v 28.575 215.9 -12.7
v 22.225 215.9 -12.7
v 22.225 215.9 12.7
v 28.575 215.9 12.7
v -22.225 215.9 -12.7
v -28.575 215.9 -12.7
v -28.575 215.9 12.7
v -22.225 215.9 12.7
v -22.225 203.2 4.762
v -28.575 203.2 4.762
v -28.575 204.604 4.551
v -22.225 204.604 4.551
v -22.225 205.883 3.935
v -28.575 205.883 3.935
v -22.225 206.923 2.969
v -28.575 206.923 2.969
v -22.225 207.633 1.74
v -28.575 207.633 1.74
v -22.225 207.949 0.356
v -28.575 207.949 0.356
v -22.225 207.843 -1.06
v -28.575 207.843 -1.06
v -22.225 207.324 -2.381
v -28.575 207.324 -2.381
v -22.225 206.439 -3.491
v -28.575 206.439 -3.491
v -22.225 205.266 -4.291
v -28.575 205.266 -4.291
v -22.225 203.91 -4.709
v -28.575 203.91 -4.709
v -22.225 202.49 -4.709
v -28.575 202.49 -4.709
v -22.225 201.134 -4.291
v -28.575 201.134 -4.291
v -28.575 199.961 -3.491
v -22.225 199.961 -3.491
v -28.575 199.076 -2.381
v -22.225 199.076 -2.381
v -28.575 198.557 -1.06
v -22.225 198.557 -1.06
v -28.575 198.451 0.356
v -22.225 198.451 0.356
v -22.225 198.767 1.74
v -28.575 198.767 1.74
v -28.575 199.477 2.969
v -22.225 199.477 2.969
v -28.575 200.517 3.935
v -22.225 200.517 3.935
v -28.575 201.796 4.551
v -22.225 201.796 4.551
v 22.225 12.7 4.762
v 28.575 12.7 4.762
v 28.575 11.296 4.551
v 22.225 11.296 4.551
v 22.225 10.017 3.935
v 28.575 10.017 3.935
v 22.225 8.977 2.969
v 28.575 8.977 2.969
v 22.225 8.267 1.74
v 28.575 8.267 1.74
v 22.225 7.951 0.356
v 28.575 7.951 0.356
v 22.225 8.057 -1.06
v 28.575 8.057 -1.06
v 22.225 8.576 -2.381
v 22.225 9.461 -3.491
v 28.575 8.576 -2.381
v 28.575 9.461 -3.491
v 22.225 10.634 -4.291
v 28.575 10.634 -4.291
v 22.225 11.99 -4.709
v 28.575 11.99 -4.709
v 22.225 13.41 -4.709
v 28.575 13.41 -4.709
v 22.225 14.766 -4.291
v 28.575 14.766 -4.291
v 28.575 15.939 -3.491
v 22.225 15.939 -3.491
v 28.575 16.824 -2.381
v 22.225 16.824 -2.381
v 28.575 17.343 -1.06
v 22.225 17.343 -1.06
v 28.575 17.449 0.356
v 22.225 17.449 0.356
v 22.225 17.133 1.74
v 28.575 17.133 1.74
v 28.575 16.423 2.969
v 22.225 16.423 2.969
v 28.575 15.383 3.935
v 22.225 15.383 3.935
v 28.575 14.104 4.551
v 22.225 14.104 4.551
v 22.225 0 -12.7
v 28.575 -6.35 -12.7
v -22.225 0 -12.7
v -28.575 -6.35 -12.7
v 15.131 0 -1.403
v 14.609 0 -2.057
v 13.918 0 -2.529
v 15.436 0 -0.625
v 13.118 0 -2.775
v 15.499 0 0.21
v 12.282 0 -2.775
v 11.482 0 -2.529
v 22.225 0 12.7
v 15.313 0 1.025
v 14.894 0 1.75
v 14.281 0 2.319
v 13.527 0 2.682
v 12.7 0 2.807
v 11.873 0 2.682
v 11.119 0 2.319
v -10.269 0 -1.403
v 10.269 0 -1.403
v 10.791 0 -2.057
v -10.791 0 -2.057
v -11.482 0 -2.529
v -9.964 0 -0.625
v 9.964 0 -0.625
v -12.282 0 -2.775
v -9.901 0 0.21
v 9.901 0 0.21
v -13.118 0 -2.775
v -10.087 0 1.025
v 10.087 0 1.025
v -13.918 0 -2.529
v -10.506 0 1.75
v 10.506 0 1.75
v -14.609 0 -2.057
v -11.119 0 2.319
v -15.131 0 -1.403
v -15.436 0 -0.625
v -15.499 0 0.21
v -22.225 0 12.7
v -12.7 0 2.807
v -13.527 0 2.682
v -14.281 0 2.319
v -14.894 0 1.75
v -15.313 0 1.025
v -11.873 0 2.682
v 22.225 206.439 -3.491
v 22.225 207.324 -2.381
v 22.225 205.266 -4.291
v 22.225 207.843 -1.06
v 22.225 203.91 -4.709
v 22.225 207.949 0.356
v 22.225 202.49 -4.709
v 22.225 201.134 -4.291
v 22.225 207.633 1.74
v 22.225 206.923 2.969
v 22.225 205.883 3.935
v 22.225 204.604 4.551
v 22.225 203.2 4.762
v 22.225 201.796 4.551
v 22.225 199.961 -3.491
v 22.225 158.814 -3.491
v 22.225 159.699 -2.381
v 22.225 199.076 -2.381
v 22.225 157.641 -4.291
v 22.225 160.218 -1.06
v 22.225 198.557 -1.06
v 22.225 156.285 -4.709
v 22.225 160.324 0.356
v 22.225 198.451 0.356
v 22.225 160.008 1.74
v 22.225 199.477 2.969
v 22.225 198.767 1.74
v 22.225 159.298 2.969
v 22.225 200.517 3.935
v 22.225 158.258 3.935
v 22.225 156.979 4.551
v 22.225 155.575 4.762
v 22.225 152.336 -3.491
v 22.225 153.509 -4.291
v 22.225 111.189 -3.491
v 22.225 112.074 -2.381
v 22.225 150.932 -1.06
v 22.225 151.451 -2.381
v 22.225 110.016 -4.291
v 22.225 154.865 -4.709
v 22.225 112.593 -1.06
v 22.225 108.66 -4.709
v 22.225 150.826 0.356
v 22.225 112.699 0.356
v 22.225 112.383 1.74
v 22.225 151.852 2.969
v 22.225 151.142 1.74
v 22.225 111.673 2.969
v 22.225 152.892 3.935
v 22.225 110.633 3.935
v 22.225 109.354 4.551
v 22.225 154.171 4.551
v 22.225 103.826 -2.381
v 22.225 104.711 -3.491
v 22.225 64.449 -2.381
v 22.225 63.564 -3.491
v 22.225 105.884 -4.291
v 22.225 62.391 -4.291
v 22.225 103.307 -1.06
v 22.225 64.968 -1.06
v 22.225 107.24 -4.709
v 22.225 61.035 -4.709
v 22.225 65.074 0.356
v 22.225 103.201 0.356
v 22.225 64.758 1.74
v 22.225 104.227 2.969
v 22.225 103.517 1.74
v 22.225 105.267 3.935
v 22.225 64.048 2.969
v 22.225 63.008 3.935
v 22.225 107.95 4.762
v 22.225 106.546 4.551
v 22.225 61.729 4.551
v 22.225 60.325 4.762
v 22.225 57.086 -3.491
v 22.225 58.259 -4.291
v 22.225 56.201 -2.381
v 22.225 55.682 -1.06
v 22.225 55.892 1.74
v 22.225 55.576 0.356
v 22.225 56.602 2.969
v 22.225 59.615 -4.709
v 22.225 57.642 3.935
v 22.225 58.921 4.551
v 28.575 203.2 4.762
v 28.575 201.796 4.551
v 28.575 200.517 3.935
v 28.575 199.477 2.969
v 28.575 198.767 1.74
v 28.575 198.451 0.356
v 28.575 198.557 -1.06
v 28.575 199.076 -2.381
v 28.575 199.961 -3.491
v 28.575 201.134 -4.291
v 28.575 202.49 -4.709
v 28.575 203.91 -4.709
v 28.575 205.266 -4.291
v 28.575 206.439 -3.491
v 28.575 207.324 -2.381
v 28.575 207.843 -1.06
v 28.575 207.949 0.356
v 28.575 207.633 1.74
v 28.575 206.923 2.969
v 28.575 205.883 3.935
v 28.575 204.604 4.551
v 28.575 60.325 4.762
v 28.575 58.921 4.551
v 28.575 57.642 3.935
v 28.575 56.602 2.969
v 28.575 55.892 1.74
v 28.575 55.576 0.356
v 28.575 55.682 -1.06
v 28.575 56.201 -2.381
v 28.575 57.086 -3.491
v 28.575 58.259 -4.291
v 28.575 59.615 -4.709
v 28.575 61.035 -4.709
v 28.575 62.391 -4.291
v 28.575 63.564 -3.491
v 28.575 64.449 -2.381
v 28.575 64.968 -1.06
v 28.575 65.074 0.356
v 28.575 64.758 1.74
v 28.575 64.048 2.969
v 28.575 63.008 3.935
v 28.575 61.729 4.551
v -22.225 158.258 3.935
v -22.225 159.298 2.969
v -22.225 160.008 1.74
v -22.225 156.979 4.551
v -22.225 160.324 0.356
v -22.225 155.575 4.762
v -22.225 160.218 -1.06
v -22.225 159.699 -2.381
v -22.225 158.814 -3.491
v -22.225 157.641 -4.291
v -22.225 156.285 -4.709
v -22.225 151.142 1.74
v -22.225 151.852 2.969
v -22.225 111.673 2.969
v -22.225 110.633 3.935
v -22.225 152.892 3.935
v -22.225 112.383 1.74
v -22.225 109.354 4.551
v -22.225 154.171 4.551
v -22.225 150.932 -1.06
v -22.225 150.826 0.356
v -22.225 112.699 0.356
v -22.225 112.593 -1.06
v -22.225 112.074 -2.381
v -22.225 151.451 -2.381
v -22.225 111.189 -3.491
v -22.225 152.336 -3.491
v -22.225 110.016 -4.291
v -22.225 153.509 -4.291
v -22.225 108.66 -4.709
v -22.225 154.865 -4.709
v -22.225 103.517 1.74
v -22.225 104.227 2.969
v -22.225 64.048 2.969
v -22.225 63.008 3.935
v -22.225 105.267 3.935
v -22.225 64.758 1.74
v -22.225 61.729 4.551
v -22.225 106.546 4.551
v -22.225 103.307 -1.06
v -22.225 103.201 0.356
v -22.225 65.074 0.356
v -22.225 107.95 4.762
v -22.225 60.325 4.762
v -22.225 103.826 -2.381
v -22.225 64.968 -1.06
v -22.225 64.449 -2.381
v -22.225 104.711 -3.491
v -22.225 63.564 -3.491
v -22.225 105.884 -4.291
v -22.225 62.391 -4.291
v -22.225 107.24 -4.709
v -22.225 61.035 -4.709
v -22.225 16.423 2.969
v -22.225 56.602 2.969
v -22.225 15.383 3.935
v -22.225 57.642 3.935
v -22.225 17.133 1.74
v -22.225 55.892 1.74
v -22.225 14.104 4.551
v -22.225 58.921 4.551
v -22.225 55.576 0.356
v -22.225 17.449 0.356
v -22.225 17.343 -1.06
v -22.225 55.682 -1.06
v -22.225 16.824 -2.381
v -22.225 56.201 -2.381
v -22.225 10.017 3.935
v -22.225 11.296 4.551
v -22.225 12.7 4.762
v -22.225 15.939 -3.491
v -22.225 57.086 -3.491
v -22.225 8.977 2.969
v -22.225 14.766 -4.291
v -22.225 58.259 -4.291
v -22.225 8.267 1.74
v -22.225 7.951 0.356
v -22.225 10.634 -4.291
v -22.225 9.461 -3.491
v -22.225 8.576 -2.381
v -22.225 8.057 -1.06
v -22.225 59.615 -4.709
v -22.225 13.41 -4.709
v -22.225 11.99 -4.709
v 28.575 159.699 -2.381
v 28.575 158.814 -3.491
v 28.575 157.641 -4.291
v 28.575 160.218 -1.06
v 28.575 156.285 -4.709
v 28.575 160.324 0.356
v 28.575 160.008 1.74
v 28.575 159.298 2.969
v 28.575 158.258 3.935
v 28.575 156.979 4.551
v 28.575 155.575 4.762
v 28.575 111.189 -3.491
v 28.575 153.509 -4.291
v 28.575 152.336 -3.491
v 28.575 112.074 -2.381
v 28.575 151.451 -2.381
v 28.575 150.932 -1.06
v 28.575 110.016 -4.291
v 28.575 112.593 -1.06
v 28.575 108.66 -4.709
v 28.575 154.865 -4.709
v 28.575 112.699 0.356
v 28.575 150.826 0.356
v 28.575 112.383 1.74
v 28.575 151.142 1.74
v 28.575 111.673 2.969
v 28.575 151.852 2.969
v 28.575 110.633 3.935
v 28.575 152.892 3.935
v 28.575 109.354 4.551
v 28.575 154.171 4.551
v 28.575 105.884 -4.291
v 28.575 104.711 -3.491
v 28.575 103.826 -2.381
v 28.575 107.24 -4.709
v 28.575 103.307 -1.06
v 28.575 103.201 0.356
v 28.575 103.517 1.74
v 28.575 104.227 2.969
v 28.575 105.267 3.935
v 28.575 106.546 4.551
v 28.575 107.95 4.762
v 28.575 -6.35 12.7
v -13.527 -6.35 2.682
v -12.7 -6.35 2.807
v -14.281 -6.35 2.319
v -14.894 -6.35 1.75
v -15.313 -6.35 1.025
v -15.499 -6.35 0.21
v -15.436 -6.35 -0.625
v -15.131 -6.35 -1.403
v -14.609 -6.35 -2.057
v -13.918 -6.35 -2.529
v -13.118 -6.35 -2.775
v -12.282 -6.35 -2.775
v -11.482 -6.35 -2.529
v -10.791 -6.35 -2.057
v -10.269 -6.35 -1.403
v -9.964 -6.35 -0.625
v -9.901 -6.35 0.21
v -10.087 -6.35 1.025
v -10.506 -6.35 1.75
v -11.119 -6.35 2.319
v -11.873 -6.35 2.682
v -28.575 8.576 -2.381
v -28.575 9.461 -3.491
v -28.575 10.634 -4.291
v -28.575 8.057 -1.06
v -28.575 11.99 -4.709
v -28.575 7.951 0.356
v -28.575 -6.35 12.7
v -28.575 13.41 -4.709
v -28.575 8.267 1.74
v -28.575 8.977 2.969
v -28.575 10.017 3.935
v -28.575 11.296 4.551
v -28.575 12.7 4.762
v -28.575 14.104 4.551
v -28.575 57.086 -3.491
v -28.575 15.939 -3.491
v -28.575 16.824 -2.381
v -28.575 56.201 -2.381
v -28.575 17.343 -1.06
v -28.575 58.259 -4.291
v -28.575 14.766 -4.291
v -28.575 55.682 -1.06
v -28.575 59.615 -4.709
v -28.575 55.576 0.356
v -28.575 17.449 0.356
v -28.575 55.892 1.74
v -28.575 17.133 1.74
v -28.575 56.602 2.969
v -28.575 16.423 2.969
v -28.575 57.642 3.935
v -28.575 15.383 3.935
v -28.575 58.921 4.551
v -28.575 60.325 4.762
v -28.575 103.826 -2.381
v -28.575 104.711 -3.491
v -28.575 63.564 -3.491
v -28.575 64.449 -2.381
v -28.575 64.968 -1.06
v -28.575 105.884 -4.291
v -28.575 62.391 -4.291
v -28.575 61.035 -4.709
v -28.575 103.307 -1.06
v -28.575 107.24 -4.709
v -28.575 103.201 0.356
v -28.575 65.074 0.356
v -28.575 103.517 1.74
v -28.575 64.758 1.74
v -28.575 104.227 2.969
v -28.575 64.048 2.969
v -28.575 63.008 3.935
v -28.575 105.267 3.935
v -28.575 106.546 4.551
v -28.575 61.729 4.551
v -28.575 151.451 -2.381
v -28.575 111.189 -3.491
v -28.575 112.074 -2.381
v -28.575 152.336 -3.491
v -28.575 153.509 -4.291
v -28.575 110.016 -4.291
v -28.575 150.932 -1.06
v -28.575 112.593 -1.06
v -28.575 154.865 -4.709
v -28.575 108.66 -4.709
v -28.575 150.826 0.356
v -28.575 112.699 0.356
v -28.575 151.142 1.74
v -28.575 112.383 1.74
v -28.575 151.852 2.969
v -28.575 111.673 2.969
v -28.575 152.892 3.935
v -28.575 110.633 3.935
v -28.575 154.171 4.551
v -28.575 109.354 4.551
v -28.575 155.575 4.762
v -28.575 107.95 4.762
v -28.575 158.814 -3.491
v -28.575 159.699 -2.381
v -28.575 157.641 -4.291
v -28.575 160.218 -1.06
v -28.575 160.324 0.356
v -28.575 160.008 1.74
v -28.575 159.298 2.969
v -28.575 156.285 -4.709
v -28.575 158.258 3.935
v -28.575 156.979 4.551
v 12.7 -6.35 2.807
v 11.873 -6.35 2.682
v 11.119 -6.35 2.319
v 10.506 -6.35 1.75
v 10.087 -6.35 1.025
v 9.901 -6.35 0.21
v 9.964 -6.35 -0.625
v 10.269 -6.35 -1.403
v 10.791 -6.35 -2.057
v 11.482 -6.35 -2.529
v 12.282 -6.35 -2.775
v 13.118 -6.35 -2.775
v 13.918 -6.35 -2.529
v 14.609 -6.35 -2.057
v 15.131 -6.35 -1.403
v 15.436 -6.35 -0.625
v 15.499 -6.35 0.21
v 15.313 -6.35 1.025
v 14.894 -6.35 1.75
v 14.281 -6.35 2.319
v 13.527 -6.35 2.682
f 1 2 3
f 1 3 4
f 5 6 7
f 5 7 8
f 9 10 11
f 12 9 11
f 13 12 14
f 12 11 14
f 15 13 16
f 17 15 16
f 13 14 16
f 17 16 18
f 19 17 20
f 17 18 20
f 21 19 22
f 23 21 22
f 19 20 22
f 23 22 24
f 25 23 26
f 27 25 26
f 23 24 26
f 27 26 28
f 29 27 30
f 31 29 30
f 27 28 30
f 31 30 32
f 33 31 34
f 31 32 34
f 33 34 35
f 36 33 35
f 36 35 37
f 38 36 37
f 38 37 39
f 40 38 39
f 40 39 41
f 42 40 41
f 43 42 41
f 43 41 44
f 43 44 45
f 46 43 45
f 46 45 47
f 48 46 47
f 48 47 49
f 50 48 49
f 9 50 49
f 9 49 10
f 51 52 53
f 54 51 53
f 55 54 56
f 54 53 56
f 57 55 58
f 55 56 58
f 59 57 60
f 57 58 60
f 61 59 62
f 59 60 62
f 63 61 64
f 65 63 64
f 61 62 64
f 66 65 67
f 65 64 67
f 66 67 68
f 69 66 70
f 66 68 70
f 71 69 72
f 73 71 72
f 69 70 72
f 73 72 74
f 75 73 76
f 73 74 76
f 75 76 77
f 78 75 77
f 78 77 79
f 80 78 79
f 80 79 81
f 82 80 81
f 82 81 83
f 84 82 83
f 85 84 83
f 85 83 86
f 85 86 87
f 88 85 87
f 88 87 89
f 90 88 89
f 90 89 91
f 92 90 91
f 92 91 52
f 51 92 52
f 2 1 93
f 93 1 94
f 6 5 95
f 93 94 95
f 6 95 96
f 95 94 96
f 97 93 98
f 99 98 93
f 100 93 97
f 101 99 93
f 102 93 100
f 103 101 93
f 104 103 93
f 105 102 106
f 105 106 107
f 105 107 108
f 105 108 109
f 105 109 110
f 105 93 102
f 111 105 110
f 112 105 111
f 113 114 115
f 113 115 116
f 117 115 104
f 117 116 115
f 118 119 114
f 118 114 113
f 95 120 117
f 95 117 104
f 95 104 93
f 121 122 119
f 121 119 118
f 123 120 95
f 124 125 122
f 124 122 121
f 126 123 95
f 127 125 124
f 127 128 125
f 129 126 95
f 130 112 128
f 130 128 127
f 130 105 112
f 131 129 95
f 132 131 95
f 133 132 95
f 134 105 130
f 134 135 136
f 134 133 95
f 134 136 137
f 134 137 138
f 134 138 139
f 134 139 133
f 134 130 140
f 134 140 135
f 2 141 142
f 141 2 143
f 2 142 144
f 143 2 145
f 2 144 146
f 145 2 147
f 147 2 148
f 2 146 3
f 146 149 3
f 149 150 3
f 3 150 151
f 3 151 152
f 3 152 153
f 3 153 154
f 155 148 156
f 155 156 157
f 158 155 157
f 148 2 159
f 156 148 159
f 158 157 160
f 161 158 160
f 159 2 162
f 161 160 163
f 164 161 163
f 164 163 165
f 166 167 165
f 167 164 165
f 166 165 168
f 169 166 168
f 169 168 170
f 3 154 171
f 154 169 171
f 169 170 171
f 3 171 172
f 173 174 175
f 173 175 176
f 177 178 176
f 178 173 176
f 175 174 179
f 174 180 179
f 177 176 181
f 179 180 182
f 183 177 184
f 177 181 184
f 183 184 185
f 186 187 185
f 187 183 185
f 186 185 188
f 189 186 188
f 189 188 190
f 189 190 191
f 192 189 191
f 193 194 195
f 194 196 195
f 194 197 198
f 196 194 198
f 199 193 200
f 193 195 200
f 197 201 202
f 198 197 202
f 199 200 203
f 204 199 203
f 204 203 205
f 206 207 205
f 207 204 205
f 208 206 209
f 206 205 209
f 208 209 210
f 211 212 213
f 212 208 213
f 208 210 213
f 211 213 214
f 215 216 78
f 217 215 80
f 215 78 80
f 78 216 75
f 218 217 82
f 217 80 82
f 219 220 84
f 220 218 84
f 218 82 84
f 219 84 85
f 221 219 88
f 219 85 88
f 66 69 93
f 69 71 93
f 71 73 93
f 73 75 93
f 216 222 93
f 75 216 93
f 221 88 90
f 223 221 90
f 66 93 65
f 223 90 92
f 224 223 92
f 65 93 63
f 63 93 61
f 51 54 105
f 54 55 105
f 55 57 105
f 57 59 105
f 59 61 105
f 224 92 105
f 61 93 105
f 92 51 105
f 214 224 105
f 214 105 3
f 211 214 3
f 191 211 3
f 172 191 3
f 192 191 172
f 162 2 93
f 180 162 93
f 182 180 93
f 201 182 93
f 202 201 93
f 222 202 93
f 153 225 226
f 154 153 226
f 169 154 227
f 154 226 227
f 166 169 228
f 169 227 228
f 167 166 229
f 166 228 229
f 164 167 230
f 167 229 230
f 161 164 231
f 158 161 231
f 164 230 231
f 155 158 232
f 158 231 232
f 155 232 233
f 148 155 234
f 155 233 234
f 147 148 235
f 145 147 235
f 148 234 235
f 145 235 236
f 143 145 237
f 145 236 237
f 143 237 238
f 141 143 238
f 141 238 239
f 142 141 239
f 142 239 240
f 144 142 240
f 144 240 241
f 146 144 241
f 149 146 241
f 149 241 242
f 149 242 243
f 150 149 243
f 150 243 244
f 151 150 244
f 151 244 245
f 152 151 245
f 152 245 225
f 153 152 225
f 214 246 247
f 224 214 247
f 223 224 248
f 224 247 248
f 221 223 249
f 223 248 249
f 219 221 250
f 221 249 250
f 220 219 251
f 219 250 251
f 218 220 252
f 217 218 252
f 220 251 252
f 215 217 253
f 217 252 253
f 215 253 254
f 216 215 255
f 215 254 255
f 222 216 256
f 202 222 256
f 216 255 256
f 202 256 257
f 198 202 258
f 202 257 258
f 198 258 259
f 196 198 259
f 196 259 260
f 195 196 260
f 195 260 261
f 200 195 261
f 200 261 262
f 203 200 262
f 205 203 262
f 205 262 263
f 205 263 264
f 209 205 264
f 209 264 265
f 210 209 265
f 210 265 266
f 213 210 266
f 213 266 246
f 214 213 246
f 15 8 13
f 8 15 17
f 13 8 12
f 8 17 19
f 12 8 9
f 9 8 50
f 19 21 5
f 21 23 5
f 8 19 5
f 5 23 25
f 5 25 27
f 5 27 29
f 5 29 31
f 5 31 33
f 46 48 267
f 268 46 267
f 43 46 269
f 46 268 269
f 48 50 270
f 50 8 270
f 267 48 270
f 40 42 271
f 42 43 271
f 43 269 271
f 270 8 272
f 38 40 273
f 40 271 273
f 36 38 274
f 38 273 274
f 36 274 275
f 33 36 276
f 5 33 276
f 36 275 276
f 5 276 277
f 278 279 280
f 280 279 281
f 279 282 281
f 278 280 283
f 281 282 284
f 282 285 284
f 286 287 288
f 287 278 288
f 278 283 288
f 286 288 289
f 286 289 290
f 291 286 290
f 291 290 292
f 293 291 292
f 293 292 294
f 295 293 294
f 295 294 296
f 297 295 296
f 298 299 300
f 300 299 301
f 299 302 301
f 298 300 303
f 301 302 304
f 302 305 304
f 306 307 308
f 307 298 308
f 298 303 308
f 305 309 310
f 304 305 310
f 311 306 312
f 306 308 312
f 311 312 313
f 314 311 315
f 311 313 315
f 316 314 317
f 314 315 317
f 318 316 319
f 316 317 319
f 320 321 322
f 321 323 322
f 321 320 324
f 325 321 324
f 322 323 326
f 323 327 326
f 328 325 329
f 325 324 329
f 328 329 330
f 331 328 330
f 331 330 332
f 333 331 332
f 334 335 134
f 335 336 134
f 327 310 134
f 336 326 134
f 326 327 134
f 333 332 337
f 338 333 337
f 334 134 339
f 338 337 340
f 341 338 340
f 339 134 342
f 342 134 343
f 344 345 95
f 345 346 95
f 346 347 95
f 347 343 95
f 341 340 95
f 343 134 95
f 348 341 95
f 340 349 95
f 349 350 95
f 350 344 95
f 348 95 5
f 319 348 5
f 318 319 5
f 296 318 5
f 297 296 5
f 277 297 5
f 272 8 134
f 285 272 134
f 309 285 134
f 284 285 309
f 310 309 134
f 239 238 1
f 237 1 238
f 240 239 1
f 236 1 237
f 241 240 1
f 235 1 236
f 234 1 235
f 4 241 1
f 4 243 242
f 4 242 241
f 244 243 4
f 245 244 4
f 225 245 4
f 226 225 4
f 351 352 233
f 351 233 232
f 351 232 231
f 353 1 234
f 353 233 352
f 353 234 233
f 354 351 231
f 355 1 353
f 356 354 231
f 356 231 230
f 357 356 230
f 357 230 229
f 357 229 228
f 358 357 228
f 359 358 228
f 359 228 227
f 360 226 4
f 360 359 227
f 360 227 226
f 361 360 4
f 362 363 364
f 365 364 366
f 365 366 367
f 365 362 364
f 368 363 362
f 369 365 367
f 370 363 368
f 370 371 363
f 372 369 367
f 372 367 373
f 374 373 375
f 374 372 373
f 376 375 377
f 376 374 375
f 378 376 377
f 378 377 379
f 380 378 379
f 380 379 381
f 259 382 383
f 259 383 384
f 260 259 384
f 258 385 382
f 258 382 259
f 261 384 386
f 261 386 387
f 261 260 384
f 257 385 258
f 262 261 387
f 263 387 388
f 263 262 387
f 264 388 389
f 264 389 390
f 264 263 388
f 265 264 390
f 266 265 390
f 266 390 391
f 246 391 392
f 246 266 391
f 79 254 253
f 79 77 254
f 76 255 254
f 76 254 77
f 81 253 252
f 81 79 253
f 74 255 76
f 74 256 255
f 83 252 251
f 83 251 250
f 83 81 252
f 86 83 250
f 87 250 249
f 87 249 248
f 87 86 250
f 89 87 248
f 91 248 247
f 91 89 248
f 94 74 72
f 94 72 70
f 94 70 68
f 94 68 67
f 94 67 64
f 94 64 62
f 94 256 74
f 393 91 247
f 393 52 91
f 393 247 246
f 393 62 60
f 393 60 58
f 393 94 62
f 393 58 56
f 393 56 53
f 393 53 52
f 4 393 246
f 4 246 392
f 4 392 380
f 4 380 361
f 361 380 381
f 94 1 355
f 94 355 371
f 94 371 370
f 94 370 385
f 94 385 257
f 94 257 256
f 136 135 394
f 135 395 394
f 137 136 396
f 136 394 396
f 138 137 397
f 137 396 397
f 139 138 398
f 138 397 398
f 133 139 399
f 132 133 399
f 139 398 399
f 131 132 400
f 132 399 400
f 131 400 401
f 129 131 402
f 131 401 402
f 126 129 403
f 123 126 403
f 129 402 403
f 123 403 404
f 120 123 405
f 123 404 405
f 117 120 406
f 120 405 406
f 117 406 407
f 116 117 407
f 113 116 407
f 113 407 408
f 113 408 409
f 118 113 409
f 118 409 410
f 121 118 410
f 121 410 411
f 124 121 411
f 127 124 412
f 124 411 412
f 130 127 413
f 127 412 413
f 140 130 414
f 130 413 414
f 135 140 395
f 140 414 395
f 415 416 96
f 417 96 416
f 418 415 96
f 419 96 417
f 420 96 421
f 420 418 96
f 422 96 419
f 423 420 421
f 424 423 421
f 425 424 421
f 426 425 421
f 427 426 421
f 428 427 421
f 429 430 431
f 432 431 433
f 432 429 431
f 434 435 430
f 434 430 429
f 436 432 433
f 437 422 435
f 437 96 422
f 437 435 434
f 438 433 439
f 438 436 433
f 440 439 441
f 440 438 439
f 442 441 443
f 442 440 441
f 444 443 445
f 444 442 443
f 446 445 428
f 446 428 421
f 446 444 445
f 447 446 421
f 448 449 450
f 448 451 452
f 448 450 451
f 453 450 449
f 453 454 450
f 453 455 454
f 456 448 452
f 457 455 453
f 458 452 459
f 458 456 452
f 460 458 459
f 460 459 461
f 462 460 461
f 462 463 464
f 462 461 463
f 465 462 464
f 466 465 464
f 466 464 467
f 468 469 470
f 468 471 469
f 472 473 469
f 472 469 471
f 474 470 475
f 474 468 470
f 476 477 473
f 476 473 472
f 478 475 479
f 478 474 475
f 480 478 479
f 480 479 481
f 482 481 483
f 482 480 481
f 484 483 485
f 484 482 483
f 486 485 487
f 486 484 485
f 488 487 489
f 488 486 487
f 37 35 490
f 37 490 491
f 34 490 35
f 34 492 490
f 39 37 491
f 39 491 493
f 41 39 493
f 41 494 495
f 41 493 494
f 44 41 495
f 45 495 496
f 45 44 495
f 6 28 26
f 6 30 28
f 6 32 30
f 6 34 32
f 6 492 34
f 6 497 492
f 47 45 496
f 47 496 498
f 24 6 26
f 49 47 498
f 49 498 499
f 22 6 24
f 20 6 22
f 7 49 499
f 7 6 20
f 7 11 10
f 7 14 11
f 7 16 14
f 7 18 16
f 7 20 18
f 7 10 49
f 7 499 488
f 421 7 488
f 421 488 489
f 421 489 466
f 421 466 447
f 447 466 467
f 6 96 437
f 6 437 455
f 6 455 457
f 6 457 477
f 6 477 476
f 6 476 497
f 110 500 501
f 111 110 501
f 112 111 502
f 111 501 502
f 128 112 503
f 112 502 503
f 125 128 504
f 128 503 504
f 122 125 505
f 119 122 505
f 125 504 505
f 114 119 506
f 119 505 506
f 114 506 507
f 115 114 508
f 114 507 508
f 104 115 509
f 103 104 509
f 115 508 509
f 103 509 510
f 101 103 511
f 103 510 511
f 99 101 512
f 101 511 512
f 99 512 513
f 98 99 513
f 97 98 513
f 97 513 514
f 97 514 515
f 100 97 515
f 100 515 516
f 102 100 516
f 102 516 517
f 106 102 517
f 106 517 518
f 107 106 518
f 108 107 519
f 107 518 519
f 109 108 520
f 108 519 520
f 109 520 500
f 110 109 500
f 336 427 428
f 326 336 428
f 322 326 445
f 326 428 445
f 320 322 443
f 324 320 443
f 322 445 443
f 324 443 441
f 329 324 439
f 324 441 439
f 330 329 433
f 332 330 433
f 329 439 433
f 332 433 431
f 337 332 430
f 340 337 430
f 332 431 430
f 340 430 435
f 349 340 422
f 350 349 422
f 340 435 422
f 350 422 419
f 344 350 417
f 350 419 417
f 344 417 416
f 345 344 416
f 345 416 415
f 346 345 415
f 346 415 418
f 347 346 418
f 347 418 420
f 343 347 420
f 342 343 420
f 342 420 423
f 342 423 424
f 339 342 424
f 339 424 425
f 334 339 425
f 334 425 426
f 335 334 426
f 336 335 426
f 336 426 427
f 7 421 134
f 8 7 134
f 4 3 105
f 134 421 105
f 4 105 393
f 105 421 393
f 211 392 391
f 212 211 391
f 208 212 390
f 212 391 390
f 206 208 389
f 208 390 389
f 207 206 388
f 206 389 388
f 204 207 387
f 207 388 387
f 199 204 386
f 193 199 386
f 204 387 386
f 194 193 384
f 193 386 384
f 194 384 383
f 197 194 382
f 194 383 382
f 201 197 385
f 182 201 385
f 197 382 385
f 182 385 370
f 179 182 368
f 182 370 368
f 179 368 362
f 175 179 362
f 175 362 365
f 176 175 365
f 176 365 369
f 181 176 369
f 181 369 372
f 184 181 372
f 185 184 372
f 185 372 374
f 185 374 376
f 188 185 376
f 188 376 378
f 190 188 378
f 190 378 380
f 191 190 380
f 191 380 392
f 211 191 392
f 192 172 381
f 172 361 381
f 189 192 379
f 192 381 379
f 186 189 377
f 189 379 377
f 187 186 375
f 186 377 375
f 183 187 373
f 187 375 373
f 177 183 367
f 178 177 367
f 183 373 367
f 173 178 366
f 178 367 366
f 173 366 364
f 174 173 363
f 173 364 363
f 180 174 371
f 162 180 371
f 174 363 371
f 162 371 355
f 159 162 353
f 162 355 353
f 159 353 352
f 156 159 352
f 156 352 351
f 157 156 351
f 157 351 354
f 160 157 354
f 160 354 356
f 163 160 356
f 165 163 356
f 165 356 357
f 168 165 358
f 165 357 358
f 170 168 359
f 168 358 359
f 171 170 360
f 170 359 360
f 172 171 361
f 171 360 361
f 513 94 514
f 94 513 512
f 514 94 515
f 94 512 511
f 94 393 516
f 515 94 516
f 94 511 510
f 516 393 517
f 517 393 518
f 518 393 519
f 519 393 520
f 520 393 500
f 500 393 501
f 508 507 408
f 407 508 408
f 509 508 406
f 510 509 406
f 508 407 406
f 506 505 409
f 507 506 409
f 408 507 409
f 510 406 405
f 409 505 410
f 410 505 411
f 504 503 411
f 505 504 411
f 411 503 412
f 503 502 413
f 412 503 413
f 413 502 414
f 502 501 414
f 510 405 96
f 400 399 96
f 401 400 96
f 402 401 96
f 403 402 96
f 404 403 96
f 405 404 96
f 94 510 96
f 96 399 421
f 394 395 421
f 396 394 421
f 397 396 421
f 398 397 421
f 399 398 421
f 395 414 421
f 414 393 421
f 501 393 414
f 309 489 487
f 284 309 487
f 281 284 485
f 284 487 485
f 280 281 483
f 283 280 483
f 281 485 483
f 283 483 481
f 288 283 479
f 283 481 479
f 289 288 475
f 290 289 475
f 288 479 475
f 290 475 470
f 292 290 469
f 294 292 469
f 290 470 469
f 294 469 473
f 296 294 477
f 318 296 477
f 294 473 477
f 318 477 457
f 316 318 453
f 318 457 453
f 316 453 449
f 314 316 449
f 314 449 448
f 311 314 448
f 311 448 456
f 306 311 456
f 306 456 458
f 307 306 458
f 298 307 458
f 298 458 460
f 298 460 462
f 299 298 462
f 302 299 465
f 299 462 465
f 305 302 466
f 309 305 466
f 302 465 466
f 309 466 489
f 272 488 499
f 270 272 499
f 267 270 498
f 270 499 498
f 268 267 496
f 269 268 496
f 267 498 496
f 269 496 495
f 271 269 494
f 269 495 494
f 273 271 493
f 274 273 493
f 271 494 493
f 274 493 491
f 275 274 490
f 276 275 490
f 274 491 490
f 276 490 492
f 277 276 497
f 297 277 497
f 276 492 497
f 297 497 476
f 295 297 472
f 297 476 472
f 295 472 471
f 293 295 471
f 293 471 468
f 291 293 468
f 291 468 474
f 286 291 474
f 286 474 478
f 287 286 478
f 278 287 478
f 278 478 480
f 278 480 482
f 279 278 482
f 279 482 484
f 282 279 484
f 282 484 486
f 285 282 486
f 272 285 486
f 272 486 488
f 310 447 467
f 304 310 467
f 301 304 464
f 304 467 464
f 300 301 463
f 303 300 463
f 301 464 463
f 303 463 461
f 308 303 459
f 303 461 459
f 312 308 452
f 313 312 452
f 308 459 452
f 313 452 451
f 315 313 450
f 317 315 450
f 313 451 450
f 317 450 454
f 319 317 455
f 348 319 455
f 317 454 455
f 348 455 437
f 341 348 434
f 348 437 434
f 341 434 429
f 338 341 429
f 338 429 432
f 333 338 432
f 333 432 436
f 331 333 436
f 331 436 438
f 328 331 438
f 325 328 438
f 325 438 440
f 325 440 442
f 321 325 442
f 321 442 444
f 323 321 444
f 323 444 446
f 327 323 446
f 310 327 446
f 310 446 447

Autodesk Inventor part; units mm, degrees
ref_plane "XZ Plane" through (0, 0, 0) normal (0, 1, 0) x (-1, 0, 0)
ref_plane "XY Plane" through (0, 0, 0) normal (0, 0, 1) x (1, 0, 0)
sketch "Sketch1" plane through (0, 0, 0) normal (0, 1, 0) x (-1, 0, 0)
  line L0 (28.575, 12.7) -> (-28.575, 12.7)
  line L1 (-28.575, 12.7) -> (-28.575, -12.7)
  line L2 (-28.575, -12.7) -> (28.575, -12.7)
  line L3 (28.575, -12.7) -> (28.575, 12.7)
  line L4 (28.575, 12.7) -> (-28.575, -12.7) construction
  line L5 (-28.575, 12.7) -> (28.575, -12.7) construction
  point P0 (0, 0)
  dimension "d0" = 57.15
  dimension "d1" = 25.4
extrude "Extrusion1" add sketch "Sketch1" against normal blind 6.35
sketch "Sketch2" plane through (0, 0, 0) normal (0, 1, 0) x (1, 0, 0)
  line L0 (-28.575, -12.7) -> (-28.575, 12.7) projected
  line L1 (-28.575, -12.7) -> (-22.225, -12.7)
  line L2 (-22.225, -12.7) -> (-22.225, 12.7)
  line L3 (-22.225, 12.7) -> (-28.575, 12.7)
  line L4 (-28.575, 12.7) -> (-28.575, -12.7)
  point P0 (0, 0)
  dimension "d4" = 6.35
extrude "Extrusion2" add sketch "Sketch2" along normal blind 215.9
sketch "Sketch5" plane through (-28.575, -6.35, -12.7) normal (-1, 0, 0) x (0, 0, 1)
  circle A0 centre (12.7, 19.05) radius 4.7625
  line L0 (0, 6.35) -> (25.4, 6.35) projected
  line L1 (12.7, 6.35) -> (12.7, 19.05) construction
  circle A1 centre (12.7, 66.675) radius 4.7625
  circle A2 centre (12.7, 114.3) radius 4.7625
  circle A3 centre (12.7, 161.925) radius 4.7625
  circle A4 centre (12.7, 209.55) radius 4.7625
  dimension "d33" = 9.525
  dimension "d34" = 12.7
  dimension "d37" = 47.625
extrude "Extrusion5" cut sketch "Sketch5" against normal through all
mirror "Mirror3" about plane through (0, 0, 0) normal (1, 0, 0) of "Extrusion2", "Extrusion5"
sketch "Sketch4" plane through (0, 0, 0) normal (0, 1, 0) x (1, 0, 0)
  point P0 (0, 0)
  point P1 (-12.7, 0)
  point P2 (12.7, 0)
  dimension "d24" = 12.7
  dimension "d25" = 12.7
hole "Hole1" at (-12.7, 0, 0) at (12.7, 0, 0) direction (0, -1, 0) diameter 5.6134 end through all clearance for "Hex Machine Screw" size "#10" standard "Ansi Unified Screw Threads"
properties part number "camPostHolderV03"
